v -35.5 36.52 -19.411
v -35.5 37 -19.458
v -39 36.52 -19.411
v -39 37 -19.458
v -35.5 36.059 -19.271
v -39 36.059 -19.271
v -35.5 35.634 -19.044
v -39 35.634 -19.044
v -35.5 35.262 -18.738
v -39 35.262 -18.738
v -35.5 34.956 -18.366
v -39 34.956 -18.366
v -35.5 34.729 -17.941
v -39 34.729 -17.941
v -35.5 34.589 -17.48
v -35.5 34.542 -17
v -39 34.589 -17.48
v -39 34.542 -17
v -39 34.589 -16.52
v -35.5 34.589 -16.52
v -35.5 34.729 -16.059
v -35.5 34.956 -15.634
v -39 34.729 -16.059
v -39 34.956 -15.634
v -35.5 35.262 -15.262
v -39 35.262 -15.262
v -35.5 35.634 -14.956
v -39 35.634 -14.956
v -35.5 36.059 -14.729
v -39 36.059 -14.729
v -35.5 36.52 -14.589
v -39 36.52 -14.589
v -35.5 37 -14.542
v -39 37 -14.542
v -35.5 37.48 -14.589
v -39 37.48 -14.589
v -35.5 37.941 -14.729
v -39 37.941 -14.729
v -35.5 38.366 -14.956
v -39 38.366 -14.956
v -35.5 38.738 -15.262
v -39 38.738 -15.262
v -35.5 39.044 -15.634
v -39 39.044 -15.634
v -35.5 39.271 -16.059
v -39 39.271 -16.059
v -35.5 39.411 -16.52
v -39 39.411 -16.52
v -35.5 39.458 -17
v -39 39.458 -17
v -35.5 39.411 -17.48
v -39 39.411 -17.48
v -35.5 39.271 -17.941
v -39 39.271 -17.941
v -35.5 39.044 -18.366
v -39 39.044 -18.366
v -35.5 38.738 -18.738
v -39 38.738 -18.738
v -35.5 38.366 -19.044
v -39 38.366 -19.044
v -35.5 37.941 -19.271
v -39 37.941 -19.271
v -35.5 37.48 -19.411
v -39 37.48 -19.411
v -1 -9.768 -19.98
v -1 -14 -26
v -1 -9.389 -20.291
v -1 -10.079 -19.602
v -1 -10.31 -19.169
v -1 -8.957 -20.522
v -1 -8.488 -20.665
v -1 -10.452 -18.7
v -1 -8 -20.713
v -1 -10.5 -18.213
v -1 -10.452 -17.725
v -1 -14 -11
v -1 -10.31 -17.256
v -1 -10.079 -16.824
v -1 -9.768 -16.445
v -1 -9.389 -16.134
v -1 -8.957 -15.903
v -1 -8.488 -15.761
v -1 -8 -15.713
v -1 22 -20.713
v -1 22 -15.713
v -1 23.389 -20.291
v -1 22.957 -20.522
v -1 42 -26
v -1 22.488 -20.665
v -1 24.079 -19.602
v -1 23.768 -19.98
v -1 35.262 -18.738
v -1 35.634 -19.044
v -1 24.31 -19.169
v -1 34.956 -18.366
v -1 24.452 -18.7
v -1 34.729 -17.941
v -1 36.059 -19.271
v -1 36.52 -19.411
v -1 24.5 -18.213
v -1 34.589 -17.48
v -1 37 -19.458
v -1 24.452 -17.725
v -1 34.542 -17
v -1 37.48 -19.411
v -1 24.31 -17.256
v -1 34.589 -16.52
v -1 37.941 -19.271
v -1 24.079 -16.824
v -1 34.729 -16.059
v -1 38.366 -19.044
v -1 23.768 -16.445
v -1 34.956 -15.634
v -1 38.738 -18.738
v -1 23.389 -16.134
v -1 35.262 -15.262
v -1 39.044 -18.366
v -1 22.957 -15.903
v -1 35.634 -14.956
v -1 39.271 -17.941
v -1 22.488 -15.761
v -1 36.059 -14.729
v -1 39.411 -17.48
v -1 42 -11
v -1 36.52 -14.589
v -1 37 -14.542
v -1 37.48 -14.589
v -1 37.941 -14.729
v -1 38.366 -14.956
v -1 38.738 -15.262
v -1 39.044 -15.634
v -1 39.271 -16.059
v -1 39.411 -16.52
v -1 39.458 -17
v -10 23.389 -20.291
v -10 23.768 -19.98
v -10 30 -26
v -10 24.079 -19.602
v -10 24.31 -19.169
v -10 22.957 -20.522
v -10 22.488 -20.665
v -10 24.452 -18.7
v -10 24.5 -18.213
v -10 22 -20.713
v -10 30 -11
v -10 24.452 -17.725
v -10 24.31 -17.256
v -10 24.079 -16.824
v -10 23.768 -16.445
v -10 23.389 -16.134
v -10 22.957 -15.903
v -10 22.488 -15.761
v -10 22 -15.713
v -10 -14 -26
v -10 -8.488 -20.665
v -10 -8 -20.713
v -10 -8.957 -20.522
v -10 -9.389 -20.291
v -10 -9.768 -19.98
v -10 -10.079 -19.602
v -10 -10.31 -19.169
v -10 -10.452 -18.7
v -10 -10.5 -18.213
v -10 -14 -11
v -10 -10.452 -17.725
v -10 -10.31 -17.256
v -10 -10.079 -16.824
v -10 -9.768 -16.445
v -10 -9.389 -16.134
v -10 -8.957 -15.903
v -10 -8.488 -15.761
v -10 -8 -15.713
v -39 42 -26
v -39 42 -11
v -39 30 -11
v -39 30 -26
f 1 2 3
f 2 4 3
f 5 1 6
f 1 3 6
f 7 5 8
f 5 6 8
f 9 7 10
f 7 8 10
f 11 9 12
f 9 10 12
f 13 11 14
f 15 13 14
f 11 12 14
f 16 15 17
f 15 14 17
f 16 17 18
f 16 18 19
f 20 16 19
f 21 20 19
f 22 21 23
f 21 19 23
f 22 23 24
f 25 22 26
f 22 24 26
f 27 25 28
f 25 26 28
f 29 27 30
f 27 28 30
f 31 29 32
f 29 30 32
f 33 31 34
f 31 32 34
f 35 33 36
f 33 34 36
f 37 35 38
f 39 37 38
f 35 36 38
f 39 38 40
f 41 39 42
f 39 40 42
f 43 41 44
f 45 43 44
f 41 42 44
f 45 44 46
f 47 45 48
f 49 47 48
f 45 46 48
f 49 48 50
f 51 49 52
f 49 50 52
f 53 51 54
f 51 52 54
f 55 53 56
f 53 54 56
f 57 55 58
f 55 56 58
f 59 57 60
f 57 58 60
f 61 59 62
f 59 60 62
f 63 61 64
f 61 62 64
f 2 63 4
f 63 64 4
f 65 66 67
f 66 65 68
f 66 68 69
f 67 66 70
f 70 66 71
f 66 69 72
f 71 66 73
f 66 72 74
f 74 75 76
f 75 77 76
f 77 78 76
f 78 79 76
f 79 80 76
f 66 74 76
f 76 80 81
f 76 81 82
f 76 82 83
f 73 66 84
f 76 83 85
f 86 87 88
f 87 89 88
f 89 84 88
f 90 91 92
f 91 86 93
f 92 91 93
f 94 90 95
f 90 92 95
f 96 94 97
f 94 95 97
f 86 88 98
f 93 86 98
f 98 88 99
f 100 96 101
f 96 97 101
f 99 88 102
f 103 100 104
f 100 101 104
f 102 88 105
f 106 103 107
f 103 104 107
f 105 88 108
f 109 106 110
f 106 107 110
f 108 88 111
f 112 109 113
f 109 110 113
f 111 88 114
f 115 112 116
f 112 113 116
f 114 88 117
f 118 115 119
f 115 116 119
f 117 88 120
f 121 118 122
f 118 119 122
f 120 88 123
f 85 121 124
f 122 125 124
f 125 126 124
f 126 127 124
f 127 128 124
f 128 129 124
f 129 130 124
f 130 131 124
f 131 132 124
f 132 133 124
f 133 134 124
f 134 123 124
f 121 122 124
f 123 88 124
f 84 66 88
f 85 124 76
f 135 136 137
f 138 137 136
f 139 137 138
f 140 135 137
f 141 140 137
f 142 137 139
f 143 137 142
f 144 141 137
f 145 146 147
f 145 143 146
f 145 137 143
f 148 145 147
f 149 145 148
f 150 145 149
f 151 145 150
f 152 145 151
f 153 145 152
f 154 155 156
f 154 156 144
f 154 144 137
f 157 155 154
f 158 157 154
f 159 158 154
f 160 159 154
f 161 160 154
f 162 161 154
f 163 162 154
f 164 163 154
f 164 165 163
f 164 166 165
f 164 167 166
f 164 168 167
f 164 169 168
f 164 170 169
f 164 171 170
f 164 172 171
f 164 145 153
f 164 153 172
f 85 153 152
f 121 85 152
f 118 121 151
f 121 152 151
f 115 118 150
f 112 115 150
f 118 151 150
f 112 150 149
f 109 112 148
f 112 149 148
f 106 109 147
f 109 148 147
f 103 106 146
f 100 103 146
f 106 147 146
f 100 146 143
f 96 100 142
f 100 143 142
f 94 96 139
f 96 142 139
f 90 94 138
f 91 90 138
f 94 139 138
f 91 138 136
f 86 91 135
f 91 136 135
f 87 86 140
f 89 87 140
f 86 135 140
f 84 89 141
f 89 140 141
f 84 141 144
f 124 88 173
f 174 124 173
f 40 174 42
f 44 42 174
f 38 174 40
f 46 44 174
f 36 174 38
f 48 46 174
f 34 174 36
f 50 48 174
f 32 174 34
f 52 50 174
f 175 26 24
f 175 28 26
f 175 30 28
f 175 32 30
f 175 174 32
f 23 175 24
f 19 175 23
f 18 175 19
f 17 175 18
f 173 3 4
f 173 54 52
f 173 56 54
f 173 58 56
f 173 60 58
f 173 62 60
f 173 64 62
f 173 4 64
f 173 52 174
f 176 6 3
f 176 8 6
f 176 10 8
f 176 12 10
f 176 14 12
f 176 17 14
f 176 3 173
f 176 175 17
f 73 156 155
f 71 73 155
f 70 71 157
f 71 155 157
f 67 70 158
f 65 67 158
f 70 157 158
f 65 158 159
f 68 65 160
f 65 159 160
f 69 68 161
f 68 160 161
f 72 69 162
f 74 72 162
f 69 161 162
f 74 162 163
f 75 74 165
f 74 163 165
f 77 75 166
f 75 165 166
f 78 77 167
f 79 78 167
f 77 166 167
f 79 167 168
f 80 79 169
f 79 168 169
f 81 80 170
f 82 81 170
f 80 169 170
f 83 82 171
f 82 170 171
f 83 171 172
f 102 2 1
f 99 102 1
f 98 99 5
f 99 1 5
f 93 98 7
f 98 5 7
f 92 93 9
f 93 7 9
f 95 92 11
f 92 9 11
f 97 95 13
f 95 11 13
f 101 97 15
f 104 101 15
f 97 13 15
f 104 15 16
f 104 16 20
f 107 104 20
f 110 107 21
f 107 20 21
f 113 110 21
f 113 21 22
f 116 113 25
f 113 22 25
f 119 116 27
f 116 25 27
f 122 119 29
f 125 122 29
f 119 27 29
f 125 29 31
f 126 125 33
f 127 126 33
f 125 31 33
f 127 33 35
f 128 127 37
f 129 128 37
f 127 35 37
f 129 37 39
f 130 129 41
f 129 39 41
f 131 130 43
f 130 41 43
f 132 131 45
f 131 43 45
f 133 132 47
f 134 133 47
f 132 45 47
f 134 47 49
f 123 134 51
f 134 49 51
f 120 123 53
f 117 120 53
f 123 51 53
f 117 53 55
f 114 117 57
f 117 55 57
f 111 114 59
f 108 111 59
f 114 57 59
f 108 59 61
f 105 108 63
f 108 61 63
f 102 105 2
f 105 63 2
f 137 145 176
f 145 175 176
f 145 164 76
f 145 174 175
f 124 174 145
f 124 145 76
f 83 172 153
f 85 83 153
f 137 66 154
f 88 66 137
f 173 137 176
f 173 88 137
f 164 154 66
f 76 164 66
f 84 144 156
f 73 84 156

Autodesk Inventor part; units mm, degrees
ref_plane "YZ Plane" through (0, 0, 0) normal (1, 0, 0) x (0, 1, 0)
ref_plane "XZ Plane" through (0, 0, 0) normal (0, 1, 0) x (-1, 0, 0)
ref_plane "XY Plane" through (0, 0, 0) normal (0, 0, 1) x (1, 0, 0)
sketch "Skizze1" plane through (0, 0, 0) normal (0, 1, 0) x (-1, 0, 0)
  line L0 (0, 0) -> (0, 8)
  line L1 (0, 8) -> (2, 8)
  line L2 (2, 8) -> (2, 4)
  line L3 (2, 4) -> (39, 4)
  line L4 (39, 4) -> (39, 0)
  line L5 (0, 0) -> (13.2064, 0)
  line L6 (0, 0) -> (0, -8)
  line L7 (0, -8) -> (2, -8)
  line L8 (2, -8) -> (2, -4)
  line L9 (2, -4) -> (39, -4)
  line L10 (39, -4) -> (39, 0)
  dimension "d1" = 8
  dimension "d2" = 2
  dimension "d3" = 4
  dimension "d4" = 37
extrude "Extrusion1" add sketch "Skizze1" along normal mid plane 100
sketch "Skizze5" plane through (-39, -50, 4) normal (0, 0, 1) x (1, 0, 0)
  line L0 (0, 0) -> (0, 100) projected
  line L1 (0, 0) -> (3.5, 0)
  line L2 (3.5, 0) -> (3.5, 20)
  line L3 (3.5, 20) -> (0, 20)
  line L4 (0, 20) -> (0, 0)
  point P0 (39, 50)
  point P1 (0, 20.0912)
  dimension "d22" = 3.5
  dimension "d23" = 20
extrude "Extrusion3" add sketch "Skizze5" along normal blind 20 and the other way blind 30
sketch "Skizze6" plane through (-39, 50, 4) normal (0, 0, 1) x (1, 0, 0)
  line L0 (0, -80) -> (0, 0) projected
  line L1 (0, 0) -> (3.5, 0)
  line L2 (3.5, 0) -> (3.5, -20)
  line L3 (3.5, -20) -> (0, -20)
  line L4 (0, -20) -> (0, 0)
  point P0 (39, -50)
  point P1 (0, -19.9088)
  point P2 (0, -20)
  dimension "d26" = 20
  dimension "d32" = 3.5
extrude "Extrusion4" add sketch "Skizze6" along normal blind 20 and the other way blind 30
sketch "Esquisse11" plane through (-35.5, 30, -4) normal (1, 0, 0) x (0, 0, -1)
  line L0 (22, 20) -> (0, 20) projected
  line L1 (22, 20) -> (22, 0) projected
  line L2 (22, -60) -> (22, -80) projected
  point P0 (-4, -30)
  point P1 (13, 7)
  point P2 (13, -67)
  dimension "d57" = 13
  dimension "d58" = 74
  dimension "d59" = 9
  dimension "d60" = 9
hole "Perçage3" at (-35.5, 37, -17) at (-35.5, -37, -17) direction (-1, 0, 0) diameter 4.917 end through all thread size "M6x1" class "6H" standard "ISO Metric profile"
sketch "Esquisse21" plane through (-35.5, -50, 4) normal (1, 0, 0) x (0, 0, -1)
  line L0 (0, 100) -> (0, 80) projected
  line L1 (0, 20) -> (0, 80) projected
  line L2 (0, 20) -> (0, 0) projected
  line L3 (0, 100) -> (0, 0) projected
  line L4 (-36.3372, 0) -> (0, 0)
  line L5 (0, 0) -> (0, 115.7943)
  line L6 (0, 115.7943) -> (-36.3372, 115.7943)
  line L7 (-36.3372, 115.7943) -> (-36.3372, 0)
  point P0 (4, 50)
  point P1 (0, 20)
extrude "Extrusion15" cut sketch "Esquisse21" along normal mid plane 9999
sketch "Esquisse28" plane through (0, 50, 0) normal (0, 1, 0) x (1, 0, 0)
  line L0 (-2, 4) -> (-35.5, 4) projected
  line L1 (-4.0336, 4) -> (2.9868, 4)
  line L2 (2.9868, 4) -> (2.9868, 11.523)
  line L3 (2.9868, 11.523) -> (-4.0336, 11.523)
  line L4 (-4.0336, 11.523) -> (-4.0336, 4)
  point P0 (0, 0)
extrude "Extrusion20" cut sketch "Esquisse28" against normal through all
sketch "Esquisse29" plane through (-35.5, -50, -4) normal (1, 0, 0) x (0, 0, -1)
  circle A0 centre (13, 87) radius 2.4585 projected
  line L0 (0, 80) -> (0, 100) projected
  line L1 (0, 80) -> (22, 80) projected
  line L2 (22, 100) -> (22, 80) projected
  line L3 (22, 100) -> (0, 100) projected
  circle A1 centre (13, 13) radius 2.4585 construction
  line L4 (0, 0) -> (0, 20) construction
  line L5 (22, 0) -> (0, 0) construction
  line L6 (22, 20) -> (22, 0) construction
  line L7 (0, 20) -> (22, 20) construction
  point P0 (-4, 50)
extrude "Extrusion21" add sketch "Esquisse29" along normal up to surface (35.5 mm away)
sketch "Esquisse30" plane through (0, -50, -4) normal (0, 0, -1) x (-1, 0, 0)
  line L0 (39, 80) -> (0, 80) projected
  line L1 (35.5, 0) -> (0, 0) projected
  line L2 (0, 80) -> (10, 80)
  line L3 (10, 80) -> (10, 0)
  line L4 (10, 0) -> (0, 0)
  line L5 (0, 0) -> (0, 80)
  point P0 (0, 0)
  dimension "d128" = 10
extrude "Extrusion22" add sketch "Esquisse30" along normal up to surface (22 mm away)
sketch "Esquisse31" plane through (-35.5, -30, -4) normal (0, 0, -1) x (-1, 0, 0)
  line L0 (8.9947, 60) -> (-25.5, 60)
  line L1 (-25.5, 60) -> (-25.5, -26.2912)
  line L2 (-25.5, -26.2912) -> (8.9947, -26.2912)
  line L3 (8.9947, -26.2912) -> (8.9947, 60)
  point P0 (-35.5, 30)
extrude "Extrusion23" cut sketch "Esquisse31" along normal blind 100 and the other way blind 100
sketch "Esquisse32" plane through (-39, 50, -26) normal (0, 0, -1) x (-1, 0, 0)
  line L0 (-24.4847, -70) -> (-46.2931, -70)
  line L1 (-46.2931, -70) -> (-46.2931, -103.0341)
  line L2 (-46.2931, -103.0341) -> (-24.4847, -103.0341)
  line L3 (-24.4847, -103.0341) -> (-24.4847, -70)
  line L4 (-29, -100) -> (-39, -100) projected
  point P0 (-39, -50)
  dimension "d137" = 30
extrude "Extrusion24" cut sketch "Esquisse32" against normal through all
sketch "Esquisse33" plane through (0, 50, 0) normal (0, 1, 0) x (1, 0, 0)
  line L0 (0, -4) -> (0, 26) projected
  line L1 (-39, 26) -> (-39, -4) projected
  line L2 (0, -4) -> (-39, -4)
  line L3 (-39, -4) -> (-39, 11)
  line L4 (-39, 11) -> (0, 11)
  line L5 (0, 11) -> (0, -4)
  point P0 (0, 0)
  point P1 (-39, -4)
extrude "Extrusion25" cut sketch "Esquisse33" against normal through all
sketch "Esquisse34" plane through (-10, -20, -26) normal (-1, 0, 0) x (0, 0, 1)
  line L0 (7.7873, 42) -> (7.7873, 12) construction
  line L1 (5.2873, 42) -> (5.2873, 12)
  line L2 (10.2873, 12) -> (10.2873, 42)
  arc A0 (10.2873, 42) -> (5.2873, 42) centre (7.7873, 42) ccw
  arc A1 (5.2873, 12) -> (10.2873, 12) centre (7.7873, 12) ccw
  line L3 (0, 0) -> (15, 0) projected
  line L4 (0, 50) -> (15, 50) projected
  point P0 (26, 20)
  point P1 (7.7873, 27)
  dimension "d141" = 8
  dimension "d142" = 5
  dimension "d151" = 30
extrude "Extrusion26" cut sketch "Esquisse34" against normal through all
sketch "Esquisse35" plane through (0, 50, 0) normal (0, 1, 0) x (1, 0, 0)
  line L0 (-1, 5.3347) -> (8.2352, 5.3347)
  line L1 (8.2352, 5.3347) -> (8.2352, 39.622)
  line L2 (8.2352, 39.622) -> (-1, 39.622)
  line L3 (-1, 39.622) -> (-1, 5.3347)
  line L4 (0, 11) -> (0, 26) projected
  point P0 (0, 0)
  dimension "d145" = 1
extrude "Extrusion27" cut sketch "Esquisse35" against normal through all
sketch "Esquisse36" plane through (-39, 50, -26) normal (0, 0, -1) x (-1, 0, 0)
  line L0 (7.4978, 8.0322) -> (-50.8948, 8.0322)
  line L1 (-50.8948, 8.0322) -> (-50.8948, -8)
  line L2 (-50.8948, -8) -> (7.4978, -8)
  line L3 (7.4978, -8) -> (7.4978, 8.0322)
  line L4 (0, 0) -> (-38, 0) projected
  point P0 (-39, -50)
  dimension "d148" = 8
extrude "Extrusion28" cut sketch "Esquisse36" against normal through all
sketch "Esquisse37" plane through (-39, 50, -26) normal (0, 0, -1) x (-1, 0, 0)
  line L0 (-23.4802, -64) -> (-55.2745, -64)
  line L1 (-55.2745, -64) -> (-55.2745, -79.7659)
  line L2 (-55.2745, -79.7659) -> (-23.4802, -79.7659)
  line L3 (-23.4802, -79.7659) -> (-23.4802, -64)
  line L4 (-38, -70) -> (-29, -70) projected
  point P0 (-39, -50)
  dimension "d152" = 6
extrude "Extrusion29" cut sketch "Esquisse37" against normal through all
properties part number "Befestigung Bremssattel"
